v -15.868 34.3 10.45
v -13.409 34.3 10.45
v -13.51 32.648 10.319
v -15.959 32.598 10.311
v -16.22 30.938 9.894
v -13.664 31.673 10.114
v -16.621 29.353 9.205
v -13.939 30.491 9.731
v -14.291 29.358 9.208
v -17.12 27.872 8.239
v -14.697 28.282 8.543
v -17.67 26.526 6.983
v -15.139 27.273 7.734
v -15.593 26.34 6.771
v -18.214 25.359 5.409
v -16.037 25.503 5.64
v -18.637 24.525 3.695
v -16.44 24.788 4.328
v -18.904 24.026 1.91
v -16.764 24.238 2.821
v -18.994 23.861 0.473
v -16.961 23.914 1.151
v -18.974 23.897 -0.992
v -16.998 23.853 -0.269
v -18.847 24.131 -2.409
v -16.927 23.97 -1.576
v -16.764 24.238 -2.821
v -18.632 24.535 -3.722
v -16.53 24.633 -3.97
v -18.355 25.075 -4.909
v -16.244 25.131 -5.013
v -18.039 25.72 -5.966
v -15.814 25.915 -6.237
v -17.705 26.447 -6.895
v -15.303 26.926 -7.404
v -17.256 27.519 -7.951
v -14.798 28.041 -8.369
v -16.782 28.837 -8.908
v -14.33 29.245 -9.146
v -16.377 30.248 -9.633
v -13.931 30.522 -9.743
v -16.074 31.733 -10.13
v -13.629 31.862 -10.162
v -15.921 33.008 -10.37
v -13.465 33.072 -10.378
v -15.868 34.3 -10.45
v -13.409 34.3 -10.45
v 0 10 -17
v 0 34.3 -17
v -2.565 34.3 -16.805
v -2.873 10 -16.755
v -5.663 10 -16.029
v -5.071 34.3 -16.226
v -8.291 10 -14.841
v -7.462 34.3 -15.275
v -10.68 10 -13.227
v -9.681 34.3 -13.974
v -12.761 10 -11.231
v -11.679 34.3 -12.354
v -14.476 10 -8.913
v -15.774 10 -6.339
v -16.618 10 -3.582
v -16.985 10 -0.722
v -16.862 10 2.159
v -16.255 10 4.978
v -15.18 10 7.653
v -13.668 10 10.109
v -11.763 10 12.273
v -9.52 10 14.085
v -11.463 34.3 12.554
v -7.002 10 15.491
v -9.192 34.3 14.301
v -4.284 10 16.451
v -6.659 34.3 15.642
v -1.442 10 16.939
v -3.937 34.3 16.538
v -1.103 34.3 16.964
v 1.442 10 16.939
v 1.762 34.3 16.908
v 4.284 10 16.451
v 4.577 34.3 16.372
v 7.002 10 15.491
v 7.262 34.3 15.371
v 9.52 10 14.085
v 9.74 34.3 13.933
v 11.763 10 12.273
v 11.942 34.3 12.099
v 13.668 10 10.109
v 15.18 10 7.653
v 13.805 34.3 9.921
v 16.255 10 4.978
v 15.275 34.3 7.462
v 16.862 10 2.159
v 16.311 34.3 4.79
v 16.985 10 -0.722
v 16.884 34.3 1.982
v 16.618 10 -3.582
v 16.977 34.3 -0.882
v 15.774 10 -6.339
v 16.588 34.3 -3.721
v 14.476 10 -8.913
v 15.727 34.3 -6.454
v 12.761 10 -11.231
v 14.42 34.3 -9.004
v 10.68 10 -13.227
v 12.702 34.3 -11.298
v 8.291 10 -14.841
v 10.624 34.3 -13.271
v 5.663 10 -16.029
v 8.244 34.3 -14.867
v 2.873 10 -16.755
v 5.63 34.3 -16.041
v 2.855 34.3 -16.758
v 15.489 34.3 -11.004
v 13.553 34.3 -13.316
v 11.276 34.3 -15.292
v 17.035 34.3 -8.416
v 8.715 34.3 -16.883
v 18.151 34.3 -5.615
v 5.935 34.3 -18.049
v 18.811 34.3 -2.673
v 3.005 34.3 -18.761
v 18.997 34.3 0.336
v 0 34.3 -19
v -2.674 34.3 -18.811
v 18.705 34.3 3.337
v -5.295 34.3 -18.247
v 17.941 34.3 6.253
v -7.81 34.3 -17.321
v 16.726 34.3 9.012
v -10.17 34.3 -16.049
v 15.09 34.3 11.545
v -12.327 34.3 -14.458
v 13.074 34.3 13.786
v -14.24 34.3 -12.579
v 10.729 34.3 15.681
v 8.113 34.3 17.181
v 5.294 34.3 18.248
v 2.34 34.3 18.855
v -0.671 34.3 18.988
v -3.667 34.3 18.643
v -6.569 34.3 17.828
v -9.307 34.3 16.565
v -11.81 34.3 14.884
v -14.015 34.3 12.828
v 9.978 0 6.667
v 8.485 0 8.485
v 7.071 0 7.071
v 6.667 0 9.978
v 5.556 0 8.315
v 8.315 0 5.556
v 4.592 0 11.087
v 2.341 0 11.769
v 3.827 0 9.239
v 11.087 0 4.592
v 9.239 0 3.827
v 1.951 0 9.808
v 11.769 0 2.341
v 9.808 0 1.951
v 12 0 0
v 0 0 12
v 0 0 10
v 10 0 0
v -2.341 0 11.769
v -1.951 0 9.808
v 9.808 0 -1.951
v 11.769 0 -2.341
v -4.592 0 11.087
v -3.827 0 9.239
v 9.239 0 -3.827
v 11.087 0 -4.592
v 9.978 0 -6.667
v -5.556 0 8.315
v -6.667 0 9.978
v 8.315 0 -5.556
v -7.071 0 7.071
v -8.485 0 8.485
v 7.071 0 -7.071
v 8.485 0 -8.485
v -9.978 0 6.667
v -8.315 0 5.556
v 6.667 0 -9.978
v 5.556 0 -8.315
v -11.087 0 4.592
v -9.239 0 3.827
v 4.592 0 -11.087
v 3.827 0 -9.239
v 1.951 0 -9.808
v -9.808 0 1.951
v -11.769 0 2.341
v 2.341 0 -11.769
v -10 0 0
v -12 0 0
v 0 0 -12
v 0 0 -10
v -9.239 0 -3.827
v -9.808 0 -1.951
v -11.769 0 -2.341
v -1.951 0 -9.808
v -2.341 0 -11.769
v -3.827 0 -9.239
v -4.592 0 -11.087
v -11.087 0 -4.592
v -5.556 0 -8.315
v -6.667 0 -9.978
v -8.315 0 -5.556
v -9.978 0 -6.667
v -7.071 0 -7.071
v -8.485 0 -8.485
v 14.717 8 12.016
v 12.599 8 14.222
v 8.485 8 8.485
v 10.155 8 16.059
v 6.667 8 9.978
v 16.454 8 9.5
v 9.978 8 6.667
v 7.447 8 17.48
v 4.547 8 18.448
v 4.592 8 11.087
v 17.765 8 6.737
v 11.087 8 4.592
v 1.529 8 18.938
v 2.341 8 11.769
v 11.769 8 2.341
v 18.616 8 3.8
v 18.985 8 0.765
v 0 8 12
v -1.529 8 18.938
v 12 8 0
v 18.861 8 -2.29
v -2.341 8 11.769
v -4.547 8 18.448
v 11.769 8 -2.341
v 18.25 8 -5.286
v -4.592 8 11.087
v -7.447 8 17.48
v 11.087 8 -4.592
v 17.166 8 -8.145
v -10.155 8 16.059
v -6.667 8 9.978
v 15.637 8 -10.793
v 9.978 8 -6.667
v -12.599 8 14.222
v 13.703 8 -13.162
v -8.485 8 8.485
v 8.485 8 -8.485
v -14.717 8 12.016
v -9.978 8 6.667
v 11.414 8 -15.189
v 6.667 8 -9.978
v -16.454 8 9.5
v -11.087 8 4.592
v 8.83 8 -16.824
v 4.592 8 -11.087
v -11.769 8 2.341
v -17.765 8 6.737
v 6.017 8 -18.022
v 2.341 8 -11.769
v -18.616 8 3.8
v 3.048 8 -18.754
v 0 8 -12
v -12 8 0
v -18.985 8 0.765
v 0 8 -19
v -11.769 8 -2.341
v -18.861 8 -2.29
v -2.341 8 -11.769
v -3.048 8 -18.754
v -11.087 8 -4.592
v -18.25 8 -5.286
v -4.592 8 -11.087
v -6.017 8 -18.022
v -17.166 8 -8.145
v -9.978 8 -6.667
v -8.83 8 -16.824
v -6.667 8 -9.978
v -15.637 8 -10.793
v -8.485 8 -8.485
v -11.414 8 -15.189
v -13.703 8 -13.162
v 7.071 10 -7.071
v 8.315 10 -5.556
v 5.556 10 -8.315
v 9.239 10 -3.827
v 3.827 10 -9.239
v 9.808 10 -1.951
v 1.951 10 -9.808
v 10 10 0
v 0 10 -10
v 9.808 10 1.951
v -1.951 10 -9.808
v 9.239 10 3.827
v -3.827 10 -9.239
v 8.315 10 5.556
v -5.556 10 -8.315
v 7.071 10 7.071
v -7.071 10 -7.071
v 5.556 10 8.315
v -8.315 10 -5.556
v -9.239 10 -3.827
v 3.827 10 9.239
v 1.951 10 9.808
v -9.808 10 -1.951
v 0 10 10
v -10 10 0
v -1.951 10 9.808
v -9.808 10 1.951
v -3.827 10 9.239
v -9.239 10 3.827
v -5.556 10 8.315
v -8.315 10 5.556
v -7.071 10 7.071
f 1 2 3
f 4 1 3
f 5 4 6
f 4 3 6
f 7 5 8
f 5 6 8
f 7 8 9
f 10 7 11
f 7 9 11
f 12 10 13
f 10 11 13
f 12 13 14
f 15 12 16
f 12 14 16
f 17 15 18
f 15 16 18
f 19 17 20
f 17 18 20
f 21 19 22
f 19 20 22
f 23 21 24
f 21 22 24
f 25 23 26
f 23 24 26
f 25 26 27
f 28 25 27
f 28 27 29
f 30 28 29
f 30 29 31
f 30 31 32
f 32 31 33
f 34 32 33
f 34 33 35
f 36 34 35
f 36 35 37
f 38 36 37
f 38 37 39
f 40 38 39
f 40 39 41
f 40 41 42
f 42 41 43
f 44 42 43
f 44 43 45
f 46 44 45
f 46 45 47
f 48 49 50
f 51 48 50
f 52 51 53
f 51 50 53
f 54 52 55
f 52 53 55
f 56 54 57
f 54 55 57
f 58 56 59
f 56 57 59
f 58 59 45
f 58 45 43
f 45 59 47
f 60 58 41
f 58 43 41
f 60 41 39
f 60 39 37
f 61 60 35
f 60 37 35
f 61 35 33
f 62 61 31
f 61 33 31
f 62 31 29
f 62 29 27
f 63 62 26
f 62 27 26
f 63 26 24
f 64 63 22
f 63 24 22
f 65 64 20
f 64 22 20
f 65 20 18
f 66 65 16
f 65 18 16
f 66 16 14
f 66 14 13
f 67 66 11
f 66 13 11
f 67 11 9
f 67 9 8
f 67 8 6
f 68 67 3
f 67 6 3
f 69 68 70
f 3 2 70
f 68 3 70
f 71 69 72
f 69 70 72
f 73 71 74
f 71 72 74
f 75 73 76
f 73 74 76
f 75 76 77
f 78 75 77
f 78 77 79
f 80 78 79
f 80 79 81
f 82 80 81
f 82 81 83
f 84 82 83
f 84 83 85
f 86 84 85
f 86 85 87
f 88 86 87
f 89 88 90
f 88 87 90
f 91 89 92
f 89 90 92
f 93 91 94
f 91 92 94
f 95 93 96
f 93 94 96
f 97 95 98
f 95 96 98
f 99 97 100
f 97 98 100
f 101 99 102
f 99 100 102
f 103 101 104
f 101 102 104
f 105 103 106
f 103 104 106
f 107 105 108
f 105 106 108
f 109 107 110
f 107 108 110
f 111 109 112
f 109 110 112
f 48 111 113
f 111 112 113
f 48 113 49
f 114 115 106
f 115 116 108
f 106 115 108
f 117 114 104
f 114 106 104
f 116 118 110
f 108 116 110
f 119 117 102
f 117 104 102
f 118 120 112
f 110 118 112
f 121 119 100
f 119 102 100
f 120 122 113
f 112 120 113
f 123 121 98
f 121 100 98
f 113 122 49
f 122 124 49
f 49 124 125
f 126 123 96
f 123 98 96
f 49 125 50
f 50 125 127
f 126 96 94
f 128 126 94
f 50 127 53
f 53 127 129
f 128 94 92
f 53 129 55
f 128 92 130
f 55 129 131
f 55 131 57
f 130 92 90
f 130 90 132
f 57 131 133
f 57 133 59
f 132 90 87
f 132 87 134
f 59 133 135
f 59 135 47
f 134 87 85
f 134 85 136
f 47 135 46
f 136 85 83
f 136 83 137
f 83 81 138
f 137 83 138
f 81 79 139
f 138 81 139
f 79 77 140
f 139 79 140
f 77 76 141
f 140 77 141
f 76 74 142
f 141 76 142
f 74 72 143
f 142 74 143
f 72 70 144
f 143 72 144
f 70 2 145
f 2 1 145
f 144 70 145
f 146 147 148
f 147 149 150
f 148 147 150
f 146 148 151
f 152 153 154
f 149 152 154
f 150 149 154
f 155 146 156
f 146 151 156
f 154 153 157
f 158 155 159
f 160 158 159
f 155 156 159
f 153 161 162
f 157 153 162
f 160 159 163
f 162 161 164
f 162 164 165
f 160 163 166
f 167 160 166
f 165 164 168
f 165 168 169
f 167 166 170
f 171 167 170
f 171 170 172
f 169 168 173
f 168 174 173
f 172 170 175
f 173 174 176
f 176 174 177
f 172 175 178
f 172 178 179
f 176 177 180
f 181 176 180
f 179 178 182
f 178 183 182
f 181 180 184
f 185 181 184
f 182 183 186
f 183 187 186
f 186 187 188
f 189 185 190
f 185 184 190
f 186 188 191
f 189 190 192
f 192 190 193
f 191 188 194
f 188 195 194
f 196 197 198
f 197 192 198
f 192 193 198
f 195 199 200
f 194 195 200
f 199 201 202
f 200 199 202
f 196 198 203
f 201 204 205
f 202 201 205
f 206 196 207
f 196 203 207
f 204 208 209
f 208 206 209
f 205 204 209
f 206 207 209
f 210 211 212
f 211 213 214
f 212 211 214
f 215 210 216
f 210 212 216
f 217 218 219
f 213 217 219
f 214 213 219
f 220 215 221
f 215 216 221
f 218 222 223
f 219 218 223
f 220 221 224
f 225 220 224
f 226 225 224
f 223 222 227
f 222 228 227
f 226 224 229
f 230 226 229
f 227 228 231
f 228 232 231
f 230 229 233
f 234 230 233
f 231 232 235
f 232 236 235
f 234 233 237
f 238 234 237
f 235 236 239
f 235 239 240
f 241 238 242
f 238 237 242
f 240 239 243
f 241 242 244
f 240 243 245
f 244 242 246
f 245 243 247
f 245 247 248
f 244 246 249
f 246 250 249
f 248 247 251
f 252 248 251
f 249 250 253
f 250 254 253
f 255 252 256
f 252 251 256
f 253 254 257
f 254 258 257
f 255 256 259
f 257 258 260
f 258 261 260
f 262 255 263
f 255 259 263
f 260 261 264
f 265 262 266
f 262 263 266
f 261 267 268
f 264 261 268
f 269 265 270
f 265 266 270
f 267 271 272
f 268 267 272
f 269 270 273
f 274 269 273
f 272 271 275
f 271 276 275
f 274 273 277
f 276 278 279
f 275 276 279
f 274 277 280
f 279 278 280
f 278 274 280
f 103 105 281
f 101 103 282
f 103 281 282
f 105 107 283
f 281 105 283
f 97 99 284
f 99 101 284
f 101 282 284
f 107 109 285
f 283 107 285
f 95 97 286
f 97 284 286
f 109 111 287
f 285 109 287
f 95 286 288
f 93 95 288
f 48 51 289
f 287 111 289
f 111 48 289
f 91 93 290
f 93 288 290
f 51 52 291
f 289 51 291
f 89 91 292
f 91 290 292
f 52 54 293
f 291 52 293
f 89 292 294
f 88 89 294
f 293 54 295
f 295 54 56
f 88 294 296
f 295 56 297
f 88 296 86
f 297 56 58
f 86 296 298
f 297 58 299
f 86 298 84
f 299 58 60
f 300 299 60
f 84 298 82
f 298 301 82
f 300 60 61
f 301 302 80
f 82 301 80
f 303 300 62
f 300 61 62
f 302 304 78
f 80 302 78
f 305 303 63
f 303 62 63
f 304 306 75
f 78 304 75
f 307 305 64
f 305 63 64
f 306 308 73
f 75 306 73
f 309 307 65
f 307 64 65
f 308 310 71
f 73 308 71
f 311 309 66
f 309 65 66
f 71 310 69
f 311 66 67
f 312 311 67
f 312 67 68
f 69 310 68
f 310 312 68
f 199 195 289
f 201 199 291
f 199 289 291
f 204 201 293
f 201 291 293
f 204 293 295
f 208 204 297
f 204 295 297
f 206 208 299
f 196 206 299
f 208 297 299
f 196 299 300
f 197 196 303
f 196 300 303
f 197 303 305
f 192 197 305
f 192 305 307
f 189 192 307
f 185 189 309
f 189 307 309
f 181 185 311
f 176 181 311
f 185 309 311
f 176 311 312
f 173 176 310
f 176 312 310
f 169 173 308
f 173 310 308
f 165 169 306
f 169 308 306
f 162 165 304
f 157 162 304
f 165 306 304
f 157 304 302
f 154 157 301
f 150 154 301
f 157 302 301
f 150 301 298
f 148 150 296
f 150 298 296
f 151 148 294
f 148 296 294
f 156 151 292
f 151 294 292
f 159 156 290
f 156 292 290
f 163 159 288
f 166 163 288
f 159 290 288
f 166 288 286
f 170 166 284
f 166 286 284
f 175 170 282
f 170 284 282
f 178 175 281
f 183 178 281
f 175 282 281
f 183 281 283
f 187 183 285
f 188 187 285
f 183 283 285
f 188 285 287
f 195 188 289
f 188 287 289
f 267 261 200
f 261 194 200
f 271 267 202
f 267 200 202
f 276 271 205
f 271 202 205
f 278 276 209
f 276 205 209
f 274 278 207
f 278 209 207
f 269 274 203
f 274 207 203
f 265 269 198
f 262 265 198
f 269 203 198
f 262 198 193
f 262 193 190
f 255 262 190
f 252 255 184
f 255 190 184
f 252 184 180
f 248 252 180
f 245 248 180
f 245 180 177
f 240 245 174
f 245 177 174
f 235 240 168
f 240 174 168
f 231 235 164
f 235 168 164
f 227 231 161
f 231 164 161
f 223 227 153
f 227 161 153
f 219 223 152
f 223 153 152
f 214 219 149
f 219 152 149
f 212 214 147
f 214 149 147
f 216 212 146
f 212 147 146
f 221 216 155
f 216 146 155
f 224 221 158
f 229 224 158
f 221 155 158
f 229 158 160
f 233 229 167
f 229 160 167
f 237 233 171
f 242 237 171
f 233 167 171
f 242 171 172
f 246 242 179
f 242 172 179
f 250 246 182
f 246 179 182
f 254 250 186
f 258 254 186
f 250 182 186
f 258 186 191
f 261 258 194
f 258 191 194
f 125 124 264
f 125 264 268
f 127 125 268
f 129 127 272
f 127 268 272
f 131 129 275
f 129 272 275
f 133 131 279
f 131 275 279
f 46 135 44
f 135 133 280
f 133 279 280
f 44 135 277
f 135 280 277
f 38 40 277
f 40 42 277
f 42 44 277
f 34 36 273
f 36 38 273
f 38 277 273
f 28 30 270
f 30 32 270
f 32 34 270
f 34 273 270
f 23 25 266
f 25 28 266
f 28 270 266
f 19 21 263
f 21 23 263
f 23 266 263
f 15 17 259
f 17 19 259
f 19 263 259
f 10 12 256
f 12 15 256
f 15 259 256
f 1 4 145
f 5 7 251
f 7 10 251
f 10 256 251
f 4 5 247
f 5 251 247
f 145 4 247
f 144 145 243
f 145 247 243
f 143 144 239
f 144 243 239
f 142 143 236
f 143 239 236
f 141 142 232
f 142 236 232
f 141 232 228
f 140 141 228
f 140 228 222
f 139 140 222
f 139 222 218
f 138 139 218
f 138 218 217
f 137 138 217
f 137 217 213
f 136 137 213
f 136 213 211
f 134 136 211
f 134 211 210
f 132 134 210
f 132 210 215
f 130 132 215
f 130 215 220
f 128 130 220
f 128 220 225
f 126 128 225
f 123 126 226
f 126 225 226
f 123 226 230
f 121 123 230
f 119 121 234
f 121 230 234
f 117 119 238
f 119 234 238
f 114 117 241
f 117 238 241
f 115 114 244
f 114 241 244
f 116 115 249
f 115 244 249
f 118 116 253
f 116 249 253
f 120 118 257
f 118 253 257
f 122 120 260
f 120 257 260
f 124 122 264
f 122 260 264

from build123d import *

# Parameters (mm, degrees)
SKETCH3_R          = 10.45
CUT_EXTRUDE1_DEPTH = 44.571665105


with BuildPart() as part:
    # Sketch2 → Revolve1 (revolve)
    with BuildSketch(Plane.XY, mode=Mode.PRIVATE) as revolve1_sk:
        Polygon((10, 0), (10, 10), (17, 10), (17, 34.3), (19, 34.3), (19, 8), (12, 8), (12, 0), align=None)
    revolve(revolve1_sk.sketch.rotate(Axis((0, 0, 0), (0, 1, 0)), 90), axis=Axis((0, 0, 0), (0, 1, 0)))

    # Sketch3 → Cut-Extrude1 (cut, through all)
    with BuildSketch(Plane(origin=(0, 0, 0), x_dir=(0, 0, -1), z_dir=(1, 0, 0))):
        with Locations((0, 34.3)):
            Circle(SKETCH3_R)
    extrude(amount=-CUT_EXTRUDE1_DEPTH, mode=Mode.SUBTRACT)


solid = part.part
